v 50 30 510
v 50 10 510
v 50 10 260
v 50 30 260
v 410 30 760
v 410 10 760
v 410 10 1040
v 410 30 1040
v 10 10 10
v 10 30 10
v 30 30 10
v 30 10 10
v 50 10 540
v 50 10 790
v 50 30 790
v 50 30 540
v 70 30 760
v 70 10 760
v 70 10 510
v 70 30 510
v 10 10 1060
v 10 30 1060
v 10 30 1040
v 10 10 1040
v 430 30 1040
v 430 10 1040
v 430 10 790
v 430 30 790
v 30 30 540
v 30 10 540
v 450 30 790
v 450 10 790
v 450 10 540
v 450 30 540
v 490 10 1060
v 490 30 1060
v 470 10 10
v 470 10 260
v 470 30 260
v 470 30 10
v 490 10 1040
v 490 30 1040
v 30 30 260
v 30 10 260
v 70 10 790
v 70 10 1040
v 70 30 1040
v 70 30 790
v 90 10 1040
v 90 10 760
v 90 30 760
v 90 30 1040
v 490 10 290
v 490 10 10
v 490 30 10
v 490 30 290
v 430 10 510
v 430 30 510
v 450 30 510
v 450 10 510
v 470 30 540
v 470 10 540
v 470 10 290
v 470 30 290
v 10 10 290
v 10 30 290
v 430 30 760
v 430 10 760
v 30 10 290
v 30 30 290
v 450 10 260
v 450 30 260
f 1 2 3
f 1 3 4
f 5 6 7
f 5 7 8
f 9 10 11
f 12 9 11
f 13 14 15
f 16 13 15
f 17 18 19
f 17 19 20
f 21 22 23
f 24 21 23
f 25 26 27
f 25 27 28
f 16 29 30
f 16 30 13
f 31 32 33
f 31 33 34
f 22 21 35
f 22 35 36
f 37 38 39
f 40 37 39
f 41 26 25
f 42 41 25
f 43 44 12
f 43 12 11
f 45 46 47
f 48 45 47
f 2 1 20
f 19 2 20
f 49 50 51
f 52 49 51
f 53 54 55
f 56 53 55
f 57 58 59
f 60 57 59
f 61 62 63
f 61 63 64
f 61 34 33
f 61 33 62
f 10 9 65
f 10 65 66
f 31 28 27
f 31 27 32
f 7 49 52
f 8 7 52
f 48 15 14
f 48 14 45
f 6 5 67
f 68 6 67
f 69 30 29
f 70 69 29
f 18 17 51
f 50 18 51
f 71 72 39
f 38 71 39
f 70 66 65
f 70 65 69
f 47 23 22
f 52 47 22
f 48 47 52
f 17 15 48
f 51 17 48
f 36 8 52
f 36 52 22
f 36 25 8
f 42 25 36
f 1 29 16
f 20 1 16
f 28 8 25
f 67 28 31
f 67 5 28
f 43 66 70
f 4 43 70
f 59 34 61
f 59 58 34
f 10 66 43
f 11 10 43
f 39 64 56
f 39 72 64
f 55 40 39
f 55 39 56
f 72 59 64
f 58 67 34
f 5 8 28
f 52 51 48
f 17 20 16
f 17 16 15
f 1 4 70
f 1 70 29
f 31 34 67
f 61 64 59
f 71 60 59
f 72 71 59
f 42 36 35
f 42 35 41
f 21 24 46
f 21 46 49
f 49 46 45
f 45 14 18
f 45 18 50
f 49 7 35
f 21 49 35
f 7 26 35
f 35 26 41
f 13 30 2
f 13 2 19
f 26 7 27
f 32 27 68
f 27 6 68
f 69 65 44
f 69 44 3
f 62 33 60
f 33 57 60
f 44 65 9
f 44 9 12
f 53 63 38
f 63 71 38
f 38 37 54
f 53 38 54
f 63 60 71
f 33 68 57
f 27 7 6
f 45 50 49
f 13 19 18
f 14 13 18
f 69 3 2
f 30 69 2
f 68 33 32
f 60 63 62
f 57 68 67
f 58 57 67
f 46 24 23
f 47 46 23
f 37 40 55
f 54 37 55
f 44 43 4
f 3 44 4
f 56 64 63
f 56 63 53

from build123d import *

# Parameters (mm, degrees)
BOX033_W           = 20
BOX033_H           = 20
BOX033_DEPTH       = 280
BOX034_W           = 20
BOX034_H           = 20
BOX034_DEPTH       = 280
BOX031_W           = 20
BOX031_H           = 20
BOX031_DEPTH       = 280
BOX032_W           = 20
BOX032_H           = 20
BOX032_DEPTH       = 280
BOX029_W           = 20
BOX029_H           = 20
BOX029_DEPTH       = 280
BOX030_W           = 20
BOX030_H           = 20
BOX030_DEPTH       = 280
BOX027_W           = 20
BOX027_H           = 20
BOX027_DEPTH       = 280
BOX028_W           = 20
BOX028_H           = 20
BOX028_DEPTH       = 280
BOX035_W           = 20
BOX035_H           = 20
BOX035_DEPTH       = 480
BOX035_PITCH_ANGLE = 90


with BuildPart() as box033:
    # Box033 → Box033 (new body)
    with BuildSketch(Plane(origin=(70, 10, 760), x_dir=(1, 0, 0), z_dir=(0, 0, 1))):
        with Locations((10, 10)):
            Rectangle(BOX033_W, BOX033_H)
    extrude(amount=BOX033_DEPTH)


with BuildPart() as box034:
    # Box034 → Box034 (new body)
    with BuildSketch(Plane(origin=(410, 10, 760), x_dir=(1, 0, 0), z_dir=(0, 0, 1))):
        with Locations((10, 10)):
            Rectangle(BOX034_W, BOX034_H)
    extrude(amount=BOX034_DEPTH)


with BuildPart() as box031:
    # Box031 → Box031 (new body)
    with BuildSketch(Plane(origin=(50, 10, 510), x_dir=(1, 0, 0), z_dir=(0, 0, 1))):
        with Locations((10, 10)):
            Rectangle(BOX031_W, BOX031_H)
    extrude(amount=BOX031_DEPTH)


with BuildPart() as box032:
    # Box032 → Box032 (new body)
    with BuildSketch(Plane(origin=(430, 10, 510), x_dir=(1, 0, 0), z_dir=(0, 0, 1))):
        with Locations((10, 10)):
            Rectangle(BOX032_W, BOX032_H)
    extrude(amount=BOX032_DEPTH)


with BuildPart() as box029:
    # Box029 → Box029 (new body)
    with BuildSketch(Plane(origin=(30, 10, 260), x_dir=(1, 0, 0), z_dir=(0, 0, 1))):
        with Locations((10, 10)):
            Rectangle(BOX029_W, BOX029_H)
    extrude(amount=BOX029_DEPTH)


with BuildPart() as box030:
    # Box030 → Box030 (new body)
    with BuildSketch(Plane(origin=(450, 10, 260), x_dir=(1, 0, 0), z_dir=(0, 0, 1))):
        with Locations((10, 10)):
            Rectangle(BOX030_W, BOX030_H)
    extrude(amount=BOX030_DEPTH)


with BuildPart() as box027:
    # Box027 → Box027 (new body)
    with BuildSketch(Plane(origin=(10, 10, 10), x_dir=(1, 0, 0), z_dir=(0, 0, 1))):
        with Locations((10, 10)):
            Rectangle(BOX027_W, BOX027_H)
    extrude(amount=BOX027_DEPTH)


with BuildPart() as box028:
    # Box028 → Box028 (new body)
    with BuildSketch(Plane(origin=(470, 10, 10), x_dir=(1, 0, 0), z_dir=(0, 0, 1))):
        with Locations((10, 10)):
            Rectangle(BOX028_W, BOX028_H)
    extrude(amount=BOX028_DEPTH)


with BuildPart() as solar_panel_supporter:
    # Box035 → Box035 (new body)
    with BuildSketch(Plane.XY):
        with Locations((10, 10)):
            Rectangle(BOX035_W, BOX035_H)
    extrude(amount=BOX035_DEPTH)


with BuildPart() as solar_panel_supporter_1:
    # Box035 pitch: moved
    add(solar_panel_supporter.part.rotate(Axis((0, 0, 0), (0, 1, 0)), BOX035_PITCH_ANGLE))


with BuildPart() as solar_panel_supporter_2:
    # Box035 placement: moved
    add(solar_panel_supporter_1.part.moved(Location((10, 10, 1060))))

    # Fusion013: union Box033, Box034, Box031, Box032, Box029, Box030, Box027, Box028
    add(box033.part)
    add(box034.part)
    add(box031.part)
    add(box032.part)
    add(box029.part)
    add(box030.part)
    add(box027.part)
    add(box028.part)


solid = solar_panel_supporter_2.part
